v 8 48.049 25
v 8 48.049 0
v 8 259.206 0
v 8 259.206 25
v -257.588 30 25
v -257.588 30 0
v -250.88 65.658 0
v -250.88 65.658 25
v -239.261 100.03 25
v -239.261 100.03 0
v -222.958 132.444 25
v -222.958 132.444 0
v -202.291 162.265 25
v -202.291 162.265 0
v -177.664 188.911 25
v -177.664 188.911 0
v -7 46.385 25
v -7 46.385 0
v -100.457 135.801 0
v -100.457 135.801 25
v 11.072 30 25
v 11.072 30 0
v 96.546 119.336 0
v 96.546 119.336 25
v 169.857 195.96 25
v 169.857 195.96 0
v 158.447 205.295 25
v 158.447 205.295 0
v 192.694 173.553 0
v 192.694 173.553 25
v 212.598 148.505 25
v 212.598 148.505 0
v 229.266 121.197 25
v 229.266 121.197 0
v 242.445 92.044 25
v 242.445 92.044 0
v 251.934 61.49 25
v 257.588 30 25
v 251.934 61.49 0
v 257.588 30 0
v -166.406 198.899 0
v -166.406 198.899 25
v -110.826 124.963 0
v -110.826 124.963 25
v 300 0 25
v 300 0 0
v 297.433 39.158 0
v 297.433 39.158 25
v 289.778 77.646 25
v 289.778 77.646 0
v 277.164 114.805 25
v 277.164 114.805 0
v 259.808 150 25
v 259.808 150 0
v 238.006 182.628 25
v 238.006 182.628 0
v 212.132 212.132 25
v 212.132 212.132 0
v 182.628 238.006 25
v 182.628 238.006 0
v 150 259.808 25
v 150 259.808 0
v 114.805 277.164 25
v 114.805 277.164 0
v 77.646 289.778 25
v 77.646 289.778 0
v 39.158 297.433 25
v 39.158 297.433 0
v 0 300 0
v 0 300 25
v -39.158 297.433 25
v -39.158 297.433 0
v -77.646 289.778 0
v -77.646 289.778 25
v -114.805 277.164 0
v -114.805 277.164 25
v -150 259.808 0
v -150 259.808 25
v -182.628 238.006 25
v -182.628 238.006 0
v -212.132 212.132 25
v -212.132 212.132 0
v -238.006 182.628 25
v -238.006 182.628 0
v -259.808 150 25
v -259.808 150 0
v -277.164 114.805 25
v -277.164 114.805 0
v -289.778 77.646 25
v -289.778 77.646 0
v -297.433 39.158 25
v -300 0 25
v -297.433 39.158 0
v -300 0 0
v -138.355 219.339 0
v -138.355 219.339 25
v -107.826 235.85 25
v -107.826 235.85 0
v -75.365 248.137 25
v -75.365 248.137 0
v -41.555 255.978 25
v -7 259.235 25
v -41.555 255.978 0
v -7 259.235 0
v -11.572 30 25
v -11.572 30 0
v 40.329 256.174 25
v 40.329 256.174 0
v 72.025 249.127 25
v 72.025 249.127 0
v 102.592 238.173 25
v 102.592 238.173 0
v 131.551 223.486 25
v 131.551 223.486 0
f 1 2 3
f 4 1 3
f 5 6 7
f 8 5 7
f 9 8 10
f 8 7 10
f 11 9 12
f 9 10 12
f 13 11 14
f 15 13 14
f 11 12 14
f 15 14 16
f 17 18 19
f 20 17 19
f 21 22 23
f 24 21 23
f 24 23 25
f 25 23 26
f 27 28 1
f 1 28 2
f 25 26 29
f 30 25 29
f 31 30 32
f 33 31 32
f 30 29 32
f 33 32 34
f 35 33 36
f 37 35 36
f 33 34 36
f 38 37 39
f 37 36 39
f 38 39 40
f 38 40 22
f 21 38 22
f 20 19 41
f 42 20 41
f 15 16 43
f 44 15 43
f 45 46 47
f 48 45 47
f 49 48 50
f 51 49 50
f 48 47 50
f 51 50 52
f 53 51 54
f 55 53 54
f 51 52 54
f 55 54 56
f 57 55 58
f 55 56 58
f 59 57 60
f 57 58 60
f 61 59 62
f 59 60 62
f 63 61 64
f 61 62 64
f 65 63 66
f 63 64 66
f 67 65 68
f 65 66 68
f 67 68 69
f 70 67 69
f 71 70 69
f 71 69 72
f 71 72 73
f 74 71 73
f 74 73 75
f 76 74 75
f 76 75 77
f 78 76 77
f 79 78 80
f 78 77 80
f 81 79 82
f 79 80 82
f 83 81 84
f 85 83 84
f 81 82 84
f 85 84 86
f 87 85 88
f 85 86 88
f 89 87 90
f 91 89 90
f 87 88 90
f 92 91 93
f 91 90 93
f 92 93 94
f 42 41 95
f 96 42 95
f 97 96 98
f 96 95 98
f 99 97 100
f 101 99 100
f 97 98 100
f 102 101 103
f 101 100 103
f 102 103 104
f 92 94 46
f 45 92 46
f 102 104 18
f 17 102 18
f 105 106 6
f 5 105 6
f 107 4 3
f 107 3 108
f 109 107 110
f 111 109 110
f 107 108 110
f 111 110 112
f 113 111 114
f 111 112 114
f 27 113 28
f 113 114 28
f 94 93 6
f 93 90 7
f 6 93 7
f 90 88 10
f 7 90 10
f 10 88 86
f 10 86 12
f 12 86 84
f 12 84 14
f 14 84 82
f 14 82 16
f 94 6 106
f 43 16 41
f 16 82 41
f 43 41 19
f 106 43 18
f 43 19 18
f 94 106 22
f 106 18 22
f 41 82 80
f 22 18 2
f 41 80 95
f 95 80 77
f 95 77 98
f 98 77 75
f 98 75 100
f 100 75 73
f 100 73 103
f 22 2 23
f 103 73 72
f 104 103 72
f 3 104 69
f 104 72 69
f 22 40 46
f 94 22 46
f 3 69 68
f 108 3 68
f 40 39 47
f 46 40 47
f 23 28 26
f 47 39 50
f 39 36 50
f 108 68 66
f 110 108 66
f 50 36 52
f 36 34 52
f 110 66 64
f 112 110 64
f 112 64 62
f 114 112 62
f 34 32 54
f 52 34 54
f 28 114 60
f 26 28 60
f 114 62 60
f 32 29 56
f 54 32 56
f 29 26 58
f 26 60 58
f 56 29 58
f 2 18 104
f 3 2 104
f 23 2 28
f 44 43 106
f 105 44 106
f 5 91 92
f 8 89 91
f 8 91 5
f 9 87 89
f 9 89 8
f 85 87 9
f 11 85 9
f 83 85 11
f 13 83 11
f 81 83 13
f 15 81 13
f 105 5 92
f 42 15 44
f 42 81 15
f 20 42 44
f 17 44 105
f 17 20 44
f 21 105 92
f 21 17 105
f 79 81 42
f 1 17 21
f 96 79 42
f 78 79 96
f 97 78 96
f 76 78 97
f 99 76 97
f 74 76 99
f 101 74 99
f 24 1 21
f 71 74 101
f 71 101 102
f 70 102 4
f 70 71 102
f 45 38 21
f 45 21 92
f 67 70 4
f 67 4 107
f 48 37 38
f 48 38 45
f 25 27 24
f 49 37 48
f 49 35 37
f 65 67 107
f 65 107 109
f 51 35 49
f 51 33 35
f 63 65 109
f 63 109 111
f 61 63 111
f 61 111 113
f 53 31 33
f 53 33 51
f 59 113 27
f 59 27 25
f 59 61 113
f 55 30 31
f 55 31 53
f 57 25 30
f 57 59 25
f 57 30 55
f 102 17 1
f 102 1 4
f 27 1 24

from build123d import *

# Parameters (mm, degrees)
F1_DEPTH = 25


with BuildPart() as f1:
    # F0 (on Top) → F1 (new body)
    with BuildSketch(Plane.XY):
        with BuildLine():
            Line((-300, 0), (300, 0))
            ThreePointArc((300, 0), (0, 300), (-300, 0))
        make_face()
        with BuildLine():
            Line((-11.572157, 30), (-257.588138, 30))
            ThreePointArc((-257.588138, 30), (-231.676934, 116.522303), (-177.663751, 188.910668))
            Line((-177.663751, 188.910668), (-110.826445, 124.963055))
            Line((-110.826445, 124.963055), (-11.572157, 30))
        make_face(mode=Mode.SUBTRACT)
        with BuildLine():
            ThreePointArc((169.856684, 195.960087), (229.266126, 121.196915), (257.588138, 30))
            Line((257.588138, 30), (11.071837, 30))
            Line((11.071837, 30), (96.545549, 119.336136))
            Line((96.545549, 119.336136), (169.856684, 195.960087))
        make_face(mode=Mode.SUBTRACT)
        with BuildLine():
            Line((-7, 46.385215), (-100.456727, 135.801364))
            Line((-100.456727, 135.801364), (-166.405643, 198.898996))
            ThreePointArc((-166.405643, 198.898996), (-91.801305, 242.536944), (-7, 259.234737))
            Line((-7, 259.234737), (-7, 211.881727))
            Line((-7, 211.881727), (-7, 46.385215))
        make_face(mode=Mode.SUBTRACT)
        with BuildLine():
            Line((158.447307, 205.295153), (8, 48.049365))
            Line((8, 48.049365), (8, 211.881727))
            Line((8, 211.881727), (8, 259.205804))
            ThreePointArc((8, 259.205804), (87.48009, 244.128824), (158.447307, 205.295153))
        make_face(mode=Mode.SUBTRACT)
    extrude(amount=F1_DEPTH)


solid = f1.part
